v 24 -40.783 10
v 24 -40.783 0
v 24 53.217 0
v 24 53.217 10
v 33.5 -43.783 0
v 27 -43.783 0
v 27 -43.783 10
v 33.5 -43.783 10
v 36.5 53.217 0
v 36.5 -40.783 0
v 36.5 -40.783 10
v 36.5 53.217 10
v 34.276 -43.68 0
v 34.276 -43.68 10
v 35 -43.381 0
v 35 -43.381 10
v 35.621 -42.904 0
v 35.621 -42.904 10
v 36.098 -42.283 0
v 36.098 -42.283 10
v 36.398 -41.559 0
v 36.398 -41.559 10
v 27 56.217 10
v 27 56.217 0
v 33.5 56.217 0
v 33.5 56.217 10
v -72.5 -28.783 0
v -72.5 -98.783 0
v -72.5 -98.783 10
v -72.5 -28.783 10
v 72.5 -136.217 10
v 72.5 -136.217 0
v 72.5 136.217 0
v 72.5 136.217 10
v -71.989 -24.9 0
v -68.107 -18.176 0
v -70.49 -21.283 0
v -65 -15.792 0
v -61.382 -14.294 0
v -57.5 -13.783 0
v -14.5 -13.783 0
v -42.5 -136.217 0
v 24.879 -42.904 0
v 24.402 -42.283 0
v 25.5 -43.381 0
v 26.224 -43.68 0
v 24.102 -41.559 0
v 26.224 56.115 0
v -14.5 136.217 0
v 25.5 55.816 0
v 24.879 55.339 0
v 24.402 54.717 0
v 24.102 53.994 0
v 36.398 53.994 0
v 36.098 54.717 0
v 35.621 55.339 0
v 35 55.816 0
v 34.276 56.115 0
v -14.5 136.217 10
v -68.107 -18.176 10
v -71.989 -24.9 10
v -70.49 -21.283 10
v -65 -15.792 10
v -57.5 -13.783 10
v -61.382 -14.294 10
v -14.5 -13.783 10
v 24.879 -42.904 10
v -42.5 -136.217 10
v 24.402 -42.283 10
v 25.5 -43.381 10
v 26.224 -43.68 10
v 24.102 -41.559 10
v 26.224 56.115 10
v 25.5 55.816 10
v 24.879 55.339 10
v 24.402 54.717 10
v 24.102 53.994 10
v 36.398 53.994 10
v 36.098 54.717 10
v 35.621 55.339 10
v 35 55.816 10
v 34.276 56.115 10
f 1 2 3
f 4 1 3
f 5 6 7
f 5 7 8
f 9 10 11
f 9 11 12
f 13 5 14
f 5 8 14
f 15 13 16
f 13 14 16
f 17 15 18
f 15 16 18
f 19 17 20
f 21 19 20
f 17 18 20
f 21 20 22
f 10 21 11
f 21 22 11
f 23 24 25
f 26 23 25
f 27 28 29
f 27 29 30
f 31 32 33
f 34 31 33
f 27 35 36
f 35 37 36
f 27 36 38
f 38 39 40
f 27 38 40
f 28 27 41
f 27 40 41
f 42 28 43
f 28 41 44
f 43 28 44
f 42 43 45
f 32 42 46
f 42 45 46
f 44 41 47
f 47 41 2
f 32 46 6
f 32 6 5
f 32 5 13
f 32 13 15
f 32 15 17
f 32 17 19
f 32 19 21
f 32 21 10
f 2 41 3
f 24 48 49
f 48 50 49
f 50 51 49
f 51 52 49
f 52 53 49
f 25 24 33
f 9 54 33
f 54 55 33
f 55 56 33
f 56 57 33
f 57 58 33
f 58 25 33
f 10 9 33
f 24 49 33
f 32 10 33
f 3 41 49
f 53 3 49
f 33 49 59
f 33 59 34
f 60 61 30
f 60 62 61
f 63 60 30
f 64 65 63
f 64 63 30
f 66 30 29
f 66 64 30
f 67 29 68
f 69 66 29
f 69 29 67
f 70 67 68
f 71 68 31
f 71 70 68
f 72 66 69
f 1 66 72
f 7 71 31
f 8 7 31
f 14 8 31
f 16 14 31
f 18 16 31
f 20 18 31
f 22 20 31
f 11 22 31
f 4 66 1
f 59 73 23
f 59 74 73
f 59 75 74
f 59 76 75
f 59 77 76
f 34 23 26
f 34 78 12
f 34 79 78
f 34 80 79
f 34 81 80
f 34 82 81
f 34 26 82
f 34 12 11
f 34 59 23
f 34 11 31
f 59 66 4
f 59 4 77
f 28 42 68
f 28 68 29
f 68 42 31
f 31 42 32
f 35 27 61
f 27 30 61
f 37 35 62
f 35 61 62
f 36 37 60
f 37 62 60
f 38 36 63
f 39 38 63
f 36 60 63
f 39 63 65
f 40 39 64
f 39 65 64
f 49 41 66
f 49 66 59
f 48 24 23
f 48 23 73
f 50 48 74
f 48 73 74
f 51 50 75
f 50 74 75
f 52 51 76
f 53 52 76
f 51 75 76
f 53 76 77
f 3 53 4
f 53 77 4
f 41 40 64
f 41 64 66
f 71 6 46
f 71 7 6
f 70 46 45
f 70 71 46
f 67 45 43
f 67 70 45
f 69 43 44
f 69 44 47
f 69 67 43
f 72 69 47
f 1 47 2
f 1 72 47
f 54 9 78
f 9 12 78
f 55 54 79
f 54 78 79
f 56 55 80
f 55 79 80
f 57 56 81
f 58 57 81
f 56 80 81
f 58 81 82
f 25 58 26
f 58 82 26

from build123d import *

# Parameters (mm, degrees)
SKETCH_1_W          = 145
SKETCH_1_H          = 272.434969596
EXTRUDE_1_DEPTH     = 10
SKETCH_2_W          = 58
SKETCH_2_H          = 150
SKETCH_2_W_2        = 12.5
SKETCH_2_H_2        = 100
CUT_EXTRUDE_1_DEPTH = 10
FILLET_1_R          = 15
FILLET_2_R          = 3


with BuildPart() as part:
    # 草图1 → 凸台-拉伸1 (new body)
    with BuildSketch(Plane.XY):
        Rectangle(SKETCH_1_W, SKETCH_1_H)
    extrude(amount=EXTRUDE_1_DEPTH)

    # 草图2 → 切除-拉伸1 (cut)
    with BuildSketch(Plane.XY):
        with Locations((-43.5, 61.217484798)):
            Rectangle(SKETCH_2_W, SKETCH_2_H)
        Polygon((-72.5, -98.782515202), (-72.5, -136.217484798), (-42.5, -136.217484798), align=None)
        with Locations((30.25, 6.217484798)):
            Rectangle(SKETCH_2_W_2, SKETCH_2_H_2)
    extrude(amount=CUT_EXTRUDE_1_DEPTH, mode=Mode.SUBTRACT)

    # 圆角1
    fillet_1_edges = [part.edges().sort_by_distance(p)[0] for p in [
        (-72.5, -13.782515202, 5),
    ]]
    fillet(fillet_1_edges, radius=FILLET_1_R)

    # 圆角2
    fillet_2_edges = [part.edges().sort_by_distance(p)[0] for p in [
        (36.5, -43.782515202, 5),
        (36.5, 56.217484798, 5),
        (24, 56.217484798, 5),
        (24, -43.782515202, 5),
    ]]
    fillet(fillet_2_edges, radius=FILLET_2_R)


solid = part.part
